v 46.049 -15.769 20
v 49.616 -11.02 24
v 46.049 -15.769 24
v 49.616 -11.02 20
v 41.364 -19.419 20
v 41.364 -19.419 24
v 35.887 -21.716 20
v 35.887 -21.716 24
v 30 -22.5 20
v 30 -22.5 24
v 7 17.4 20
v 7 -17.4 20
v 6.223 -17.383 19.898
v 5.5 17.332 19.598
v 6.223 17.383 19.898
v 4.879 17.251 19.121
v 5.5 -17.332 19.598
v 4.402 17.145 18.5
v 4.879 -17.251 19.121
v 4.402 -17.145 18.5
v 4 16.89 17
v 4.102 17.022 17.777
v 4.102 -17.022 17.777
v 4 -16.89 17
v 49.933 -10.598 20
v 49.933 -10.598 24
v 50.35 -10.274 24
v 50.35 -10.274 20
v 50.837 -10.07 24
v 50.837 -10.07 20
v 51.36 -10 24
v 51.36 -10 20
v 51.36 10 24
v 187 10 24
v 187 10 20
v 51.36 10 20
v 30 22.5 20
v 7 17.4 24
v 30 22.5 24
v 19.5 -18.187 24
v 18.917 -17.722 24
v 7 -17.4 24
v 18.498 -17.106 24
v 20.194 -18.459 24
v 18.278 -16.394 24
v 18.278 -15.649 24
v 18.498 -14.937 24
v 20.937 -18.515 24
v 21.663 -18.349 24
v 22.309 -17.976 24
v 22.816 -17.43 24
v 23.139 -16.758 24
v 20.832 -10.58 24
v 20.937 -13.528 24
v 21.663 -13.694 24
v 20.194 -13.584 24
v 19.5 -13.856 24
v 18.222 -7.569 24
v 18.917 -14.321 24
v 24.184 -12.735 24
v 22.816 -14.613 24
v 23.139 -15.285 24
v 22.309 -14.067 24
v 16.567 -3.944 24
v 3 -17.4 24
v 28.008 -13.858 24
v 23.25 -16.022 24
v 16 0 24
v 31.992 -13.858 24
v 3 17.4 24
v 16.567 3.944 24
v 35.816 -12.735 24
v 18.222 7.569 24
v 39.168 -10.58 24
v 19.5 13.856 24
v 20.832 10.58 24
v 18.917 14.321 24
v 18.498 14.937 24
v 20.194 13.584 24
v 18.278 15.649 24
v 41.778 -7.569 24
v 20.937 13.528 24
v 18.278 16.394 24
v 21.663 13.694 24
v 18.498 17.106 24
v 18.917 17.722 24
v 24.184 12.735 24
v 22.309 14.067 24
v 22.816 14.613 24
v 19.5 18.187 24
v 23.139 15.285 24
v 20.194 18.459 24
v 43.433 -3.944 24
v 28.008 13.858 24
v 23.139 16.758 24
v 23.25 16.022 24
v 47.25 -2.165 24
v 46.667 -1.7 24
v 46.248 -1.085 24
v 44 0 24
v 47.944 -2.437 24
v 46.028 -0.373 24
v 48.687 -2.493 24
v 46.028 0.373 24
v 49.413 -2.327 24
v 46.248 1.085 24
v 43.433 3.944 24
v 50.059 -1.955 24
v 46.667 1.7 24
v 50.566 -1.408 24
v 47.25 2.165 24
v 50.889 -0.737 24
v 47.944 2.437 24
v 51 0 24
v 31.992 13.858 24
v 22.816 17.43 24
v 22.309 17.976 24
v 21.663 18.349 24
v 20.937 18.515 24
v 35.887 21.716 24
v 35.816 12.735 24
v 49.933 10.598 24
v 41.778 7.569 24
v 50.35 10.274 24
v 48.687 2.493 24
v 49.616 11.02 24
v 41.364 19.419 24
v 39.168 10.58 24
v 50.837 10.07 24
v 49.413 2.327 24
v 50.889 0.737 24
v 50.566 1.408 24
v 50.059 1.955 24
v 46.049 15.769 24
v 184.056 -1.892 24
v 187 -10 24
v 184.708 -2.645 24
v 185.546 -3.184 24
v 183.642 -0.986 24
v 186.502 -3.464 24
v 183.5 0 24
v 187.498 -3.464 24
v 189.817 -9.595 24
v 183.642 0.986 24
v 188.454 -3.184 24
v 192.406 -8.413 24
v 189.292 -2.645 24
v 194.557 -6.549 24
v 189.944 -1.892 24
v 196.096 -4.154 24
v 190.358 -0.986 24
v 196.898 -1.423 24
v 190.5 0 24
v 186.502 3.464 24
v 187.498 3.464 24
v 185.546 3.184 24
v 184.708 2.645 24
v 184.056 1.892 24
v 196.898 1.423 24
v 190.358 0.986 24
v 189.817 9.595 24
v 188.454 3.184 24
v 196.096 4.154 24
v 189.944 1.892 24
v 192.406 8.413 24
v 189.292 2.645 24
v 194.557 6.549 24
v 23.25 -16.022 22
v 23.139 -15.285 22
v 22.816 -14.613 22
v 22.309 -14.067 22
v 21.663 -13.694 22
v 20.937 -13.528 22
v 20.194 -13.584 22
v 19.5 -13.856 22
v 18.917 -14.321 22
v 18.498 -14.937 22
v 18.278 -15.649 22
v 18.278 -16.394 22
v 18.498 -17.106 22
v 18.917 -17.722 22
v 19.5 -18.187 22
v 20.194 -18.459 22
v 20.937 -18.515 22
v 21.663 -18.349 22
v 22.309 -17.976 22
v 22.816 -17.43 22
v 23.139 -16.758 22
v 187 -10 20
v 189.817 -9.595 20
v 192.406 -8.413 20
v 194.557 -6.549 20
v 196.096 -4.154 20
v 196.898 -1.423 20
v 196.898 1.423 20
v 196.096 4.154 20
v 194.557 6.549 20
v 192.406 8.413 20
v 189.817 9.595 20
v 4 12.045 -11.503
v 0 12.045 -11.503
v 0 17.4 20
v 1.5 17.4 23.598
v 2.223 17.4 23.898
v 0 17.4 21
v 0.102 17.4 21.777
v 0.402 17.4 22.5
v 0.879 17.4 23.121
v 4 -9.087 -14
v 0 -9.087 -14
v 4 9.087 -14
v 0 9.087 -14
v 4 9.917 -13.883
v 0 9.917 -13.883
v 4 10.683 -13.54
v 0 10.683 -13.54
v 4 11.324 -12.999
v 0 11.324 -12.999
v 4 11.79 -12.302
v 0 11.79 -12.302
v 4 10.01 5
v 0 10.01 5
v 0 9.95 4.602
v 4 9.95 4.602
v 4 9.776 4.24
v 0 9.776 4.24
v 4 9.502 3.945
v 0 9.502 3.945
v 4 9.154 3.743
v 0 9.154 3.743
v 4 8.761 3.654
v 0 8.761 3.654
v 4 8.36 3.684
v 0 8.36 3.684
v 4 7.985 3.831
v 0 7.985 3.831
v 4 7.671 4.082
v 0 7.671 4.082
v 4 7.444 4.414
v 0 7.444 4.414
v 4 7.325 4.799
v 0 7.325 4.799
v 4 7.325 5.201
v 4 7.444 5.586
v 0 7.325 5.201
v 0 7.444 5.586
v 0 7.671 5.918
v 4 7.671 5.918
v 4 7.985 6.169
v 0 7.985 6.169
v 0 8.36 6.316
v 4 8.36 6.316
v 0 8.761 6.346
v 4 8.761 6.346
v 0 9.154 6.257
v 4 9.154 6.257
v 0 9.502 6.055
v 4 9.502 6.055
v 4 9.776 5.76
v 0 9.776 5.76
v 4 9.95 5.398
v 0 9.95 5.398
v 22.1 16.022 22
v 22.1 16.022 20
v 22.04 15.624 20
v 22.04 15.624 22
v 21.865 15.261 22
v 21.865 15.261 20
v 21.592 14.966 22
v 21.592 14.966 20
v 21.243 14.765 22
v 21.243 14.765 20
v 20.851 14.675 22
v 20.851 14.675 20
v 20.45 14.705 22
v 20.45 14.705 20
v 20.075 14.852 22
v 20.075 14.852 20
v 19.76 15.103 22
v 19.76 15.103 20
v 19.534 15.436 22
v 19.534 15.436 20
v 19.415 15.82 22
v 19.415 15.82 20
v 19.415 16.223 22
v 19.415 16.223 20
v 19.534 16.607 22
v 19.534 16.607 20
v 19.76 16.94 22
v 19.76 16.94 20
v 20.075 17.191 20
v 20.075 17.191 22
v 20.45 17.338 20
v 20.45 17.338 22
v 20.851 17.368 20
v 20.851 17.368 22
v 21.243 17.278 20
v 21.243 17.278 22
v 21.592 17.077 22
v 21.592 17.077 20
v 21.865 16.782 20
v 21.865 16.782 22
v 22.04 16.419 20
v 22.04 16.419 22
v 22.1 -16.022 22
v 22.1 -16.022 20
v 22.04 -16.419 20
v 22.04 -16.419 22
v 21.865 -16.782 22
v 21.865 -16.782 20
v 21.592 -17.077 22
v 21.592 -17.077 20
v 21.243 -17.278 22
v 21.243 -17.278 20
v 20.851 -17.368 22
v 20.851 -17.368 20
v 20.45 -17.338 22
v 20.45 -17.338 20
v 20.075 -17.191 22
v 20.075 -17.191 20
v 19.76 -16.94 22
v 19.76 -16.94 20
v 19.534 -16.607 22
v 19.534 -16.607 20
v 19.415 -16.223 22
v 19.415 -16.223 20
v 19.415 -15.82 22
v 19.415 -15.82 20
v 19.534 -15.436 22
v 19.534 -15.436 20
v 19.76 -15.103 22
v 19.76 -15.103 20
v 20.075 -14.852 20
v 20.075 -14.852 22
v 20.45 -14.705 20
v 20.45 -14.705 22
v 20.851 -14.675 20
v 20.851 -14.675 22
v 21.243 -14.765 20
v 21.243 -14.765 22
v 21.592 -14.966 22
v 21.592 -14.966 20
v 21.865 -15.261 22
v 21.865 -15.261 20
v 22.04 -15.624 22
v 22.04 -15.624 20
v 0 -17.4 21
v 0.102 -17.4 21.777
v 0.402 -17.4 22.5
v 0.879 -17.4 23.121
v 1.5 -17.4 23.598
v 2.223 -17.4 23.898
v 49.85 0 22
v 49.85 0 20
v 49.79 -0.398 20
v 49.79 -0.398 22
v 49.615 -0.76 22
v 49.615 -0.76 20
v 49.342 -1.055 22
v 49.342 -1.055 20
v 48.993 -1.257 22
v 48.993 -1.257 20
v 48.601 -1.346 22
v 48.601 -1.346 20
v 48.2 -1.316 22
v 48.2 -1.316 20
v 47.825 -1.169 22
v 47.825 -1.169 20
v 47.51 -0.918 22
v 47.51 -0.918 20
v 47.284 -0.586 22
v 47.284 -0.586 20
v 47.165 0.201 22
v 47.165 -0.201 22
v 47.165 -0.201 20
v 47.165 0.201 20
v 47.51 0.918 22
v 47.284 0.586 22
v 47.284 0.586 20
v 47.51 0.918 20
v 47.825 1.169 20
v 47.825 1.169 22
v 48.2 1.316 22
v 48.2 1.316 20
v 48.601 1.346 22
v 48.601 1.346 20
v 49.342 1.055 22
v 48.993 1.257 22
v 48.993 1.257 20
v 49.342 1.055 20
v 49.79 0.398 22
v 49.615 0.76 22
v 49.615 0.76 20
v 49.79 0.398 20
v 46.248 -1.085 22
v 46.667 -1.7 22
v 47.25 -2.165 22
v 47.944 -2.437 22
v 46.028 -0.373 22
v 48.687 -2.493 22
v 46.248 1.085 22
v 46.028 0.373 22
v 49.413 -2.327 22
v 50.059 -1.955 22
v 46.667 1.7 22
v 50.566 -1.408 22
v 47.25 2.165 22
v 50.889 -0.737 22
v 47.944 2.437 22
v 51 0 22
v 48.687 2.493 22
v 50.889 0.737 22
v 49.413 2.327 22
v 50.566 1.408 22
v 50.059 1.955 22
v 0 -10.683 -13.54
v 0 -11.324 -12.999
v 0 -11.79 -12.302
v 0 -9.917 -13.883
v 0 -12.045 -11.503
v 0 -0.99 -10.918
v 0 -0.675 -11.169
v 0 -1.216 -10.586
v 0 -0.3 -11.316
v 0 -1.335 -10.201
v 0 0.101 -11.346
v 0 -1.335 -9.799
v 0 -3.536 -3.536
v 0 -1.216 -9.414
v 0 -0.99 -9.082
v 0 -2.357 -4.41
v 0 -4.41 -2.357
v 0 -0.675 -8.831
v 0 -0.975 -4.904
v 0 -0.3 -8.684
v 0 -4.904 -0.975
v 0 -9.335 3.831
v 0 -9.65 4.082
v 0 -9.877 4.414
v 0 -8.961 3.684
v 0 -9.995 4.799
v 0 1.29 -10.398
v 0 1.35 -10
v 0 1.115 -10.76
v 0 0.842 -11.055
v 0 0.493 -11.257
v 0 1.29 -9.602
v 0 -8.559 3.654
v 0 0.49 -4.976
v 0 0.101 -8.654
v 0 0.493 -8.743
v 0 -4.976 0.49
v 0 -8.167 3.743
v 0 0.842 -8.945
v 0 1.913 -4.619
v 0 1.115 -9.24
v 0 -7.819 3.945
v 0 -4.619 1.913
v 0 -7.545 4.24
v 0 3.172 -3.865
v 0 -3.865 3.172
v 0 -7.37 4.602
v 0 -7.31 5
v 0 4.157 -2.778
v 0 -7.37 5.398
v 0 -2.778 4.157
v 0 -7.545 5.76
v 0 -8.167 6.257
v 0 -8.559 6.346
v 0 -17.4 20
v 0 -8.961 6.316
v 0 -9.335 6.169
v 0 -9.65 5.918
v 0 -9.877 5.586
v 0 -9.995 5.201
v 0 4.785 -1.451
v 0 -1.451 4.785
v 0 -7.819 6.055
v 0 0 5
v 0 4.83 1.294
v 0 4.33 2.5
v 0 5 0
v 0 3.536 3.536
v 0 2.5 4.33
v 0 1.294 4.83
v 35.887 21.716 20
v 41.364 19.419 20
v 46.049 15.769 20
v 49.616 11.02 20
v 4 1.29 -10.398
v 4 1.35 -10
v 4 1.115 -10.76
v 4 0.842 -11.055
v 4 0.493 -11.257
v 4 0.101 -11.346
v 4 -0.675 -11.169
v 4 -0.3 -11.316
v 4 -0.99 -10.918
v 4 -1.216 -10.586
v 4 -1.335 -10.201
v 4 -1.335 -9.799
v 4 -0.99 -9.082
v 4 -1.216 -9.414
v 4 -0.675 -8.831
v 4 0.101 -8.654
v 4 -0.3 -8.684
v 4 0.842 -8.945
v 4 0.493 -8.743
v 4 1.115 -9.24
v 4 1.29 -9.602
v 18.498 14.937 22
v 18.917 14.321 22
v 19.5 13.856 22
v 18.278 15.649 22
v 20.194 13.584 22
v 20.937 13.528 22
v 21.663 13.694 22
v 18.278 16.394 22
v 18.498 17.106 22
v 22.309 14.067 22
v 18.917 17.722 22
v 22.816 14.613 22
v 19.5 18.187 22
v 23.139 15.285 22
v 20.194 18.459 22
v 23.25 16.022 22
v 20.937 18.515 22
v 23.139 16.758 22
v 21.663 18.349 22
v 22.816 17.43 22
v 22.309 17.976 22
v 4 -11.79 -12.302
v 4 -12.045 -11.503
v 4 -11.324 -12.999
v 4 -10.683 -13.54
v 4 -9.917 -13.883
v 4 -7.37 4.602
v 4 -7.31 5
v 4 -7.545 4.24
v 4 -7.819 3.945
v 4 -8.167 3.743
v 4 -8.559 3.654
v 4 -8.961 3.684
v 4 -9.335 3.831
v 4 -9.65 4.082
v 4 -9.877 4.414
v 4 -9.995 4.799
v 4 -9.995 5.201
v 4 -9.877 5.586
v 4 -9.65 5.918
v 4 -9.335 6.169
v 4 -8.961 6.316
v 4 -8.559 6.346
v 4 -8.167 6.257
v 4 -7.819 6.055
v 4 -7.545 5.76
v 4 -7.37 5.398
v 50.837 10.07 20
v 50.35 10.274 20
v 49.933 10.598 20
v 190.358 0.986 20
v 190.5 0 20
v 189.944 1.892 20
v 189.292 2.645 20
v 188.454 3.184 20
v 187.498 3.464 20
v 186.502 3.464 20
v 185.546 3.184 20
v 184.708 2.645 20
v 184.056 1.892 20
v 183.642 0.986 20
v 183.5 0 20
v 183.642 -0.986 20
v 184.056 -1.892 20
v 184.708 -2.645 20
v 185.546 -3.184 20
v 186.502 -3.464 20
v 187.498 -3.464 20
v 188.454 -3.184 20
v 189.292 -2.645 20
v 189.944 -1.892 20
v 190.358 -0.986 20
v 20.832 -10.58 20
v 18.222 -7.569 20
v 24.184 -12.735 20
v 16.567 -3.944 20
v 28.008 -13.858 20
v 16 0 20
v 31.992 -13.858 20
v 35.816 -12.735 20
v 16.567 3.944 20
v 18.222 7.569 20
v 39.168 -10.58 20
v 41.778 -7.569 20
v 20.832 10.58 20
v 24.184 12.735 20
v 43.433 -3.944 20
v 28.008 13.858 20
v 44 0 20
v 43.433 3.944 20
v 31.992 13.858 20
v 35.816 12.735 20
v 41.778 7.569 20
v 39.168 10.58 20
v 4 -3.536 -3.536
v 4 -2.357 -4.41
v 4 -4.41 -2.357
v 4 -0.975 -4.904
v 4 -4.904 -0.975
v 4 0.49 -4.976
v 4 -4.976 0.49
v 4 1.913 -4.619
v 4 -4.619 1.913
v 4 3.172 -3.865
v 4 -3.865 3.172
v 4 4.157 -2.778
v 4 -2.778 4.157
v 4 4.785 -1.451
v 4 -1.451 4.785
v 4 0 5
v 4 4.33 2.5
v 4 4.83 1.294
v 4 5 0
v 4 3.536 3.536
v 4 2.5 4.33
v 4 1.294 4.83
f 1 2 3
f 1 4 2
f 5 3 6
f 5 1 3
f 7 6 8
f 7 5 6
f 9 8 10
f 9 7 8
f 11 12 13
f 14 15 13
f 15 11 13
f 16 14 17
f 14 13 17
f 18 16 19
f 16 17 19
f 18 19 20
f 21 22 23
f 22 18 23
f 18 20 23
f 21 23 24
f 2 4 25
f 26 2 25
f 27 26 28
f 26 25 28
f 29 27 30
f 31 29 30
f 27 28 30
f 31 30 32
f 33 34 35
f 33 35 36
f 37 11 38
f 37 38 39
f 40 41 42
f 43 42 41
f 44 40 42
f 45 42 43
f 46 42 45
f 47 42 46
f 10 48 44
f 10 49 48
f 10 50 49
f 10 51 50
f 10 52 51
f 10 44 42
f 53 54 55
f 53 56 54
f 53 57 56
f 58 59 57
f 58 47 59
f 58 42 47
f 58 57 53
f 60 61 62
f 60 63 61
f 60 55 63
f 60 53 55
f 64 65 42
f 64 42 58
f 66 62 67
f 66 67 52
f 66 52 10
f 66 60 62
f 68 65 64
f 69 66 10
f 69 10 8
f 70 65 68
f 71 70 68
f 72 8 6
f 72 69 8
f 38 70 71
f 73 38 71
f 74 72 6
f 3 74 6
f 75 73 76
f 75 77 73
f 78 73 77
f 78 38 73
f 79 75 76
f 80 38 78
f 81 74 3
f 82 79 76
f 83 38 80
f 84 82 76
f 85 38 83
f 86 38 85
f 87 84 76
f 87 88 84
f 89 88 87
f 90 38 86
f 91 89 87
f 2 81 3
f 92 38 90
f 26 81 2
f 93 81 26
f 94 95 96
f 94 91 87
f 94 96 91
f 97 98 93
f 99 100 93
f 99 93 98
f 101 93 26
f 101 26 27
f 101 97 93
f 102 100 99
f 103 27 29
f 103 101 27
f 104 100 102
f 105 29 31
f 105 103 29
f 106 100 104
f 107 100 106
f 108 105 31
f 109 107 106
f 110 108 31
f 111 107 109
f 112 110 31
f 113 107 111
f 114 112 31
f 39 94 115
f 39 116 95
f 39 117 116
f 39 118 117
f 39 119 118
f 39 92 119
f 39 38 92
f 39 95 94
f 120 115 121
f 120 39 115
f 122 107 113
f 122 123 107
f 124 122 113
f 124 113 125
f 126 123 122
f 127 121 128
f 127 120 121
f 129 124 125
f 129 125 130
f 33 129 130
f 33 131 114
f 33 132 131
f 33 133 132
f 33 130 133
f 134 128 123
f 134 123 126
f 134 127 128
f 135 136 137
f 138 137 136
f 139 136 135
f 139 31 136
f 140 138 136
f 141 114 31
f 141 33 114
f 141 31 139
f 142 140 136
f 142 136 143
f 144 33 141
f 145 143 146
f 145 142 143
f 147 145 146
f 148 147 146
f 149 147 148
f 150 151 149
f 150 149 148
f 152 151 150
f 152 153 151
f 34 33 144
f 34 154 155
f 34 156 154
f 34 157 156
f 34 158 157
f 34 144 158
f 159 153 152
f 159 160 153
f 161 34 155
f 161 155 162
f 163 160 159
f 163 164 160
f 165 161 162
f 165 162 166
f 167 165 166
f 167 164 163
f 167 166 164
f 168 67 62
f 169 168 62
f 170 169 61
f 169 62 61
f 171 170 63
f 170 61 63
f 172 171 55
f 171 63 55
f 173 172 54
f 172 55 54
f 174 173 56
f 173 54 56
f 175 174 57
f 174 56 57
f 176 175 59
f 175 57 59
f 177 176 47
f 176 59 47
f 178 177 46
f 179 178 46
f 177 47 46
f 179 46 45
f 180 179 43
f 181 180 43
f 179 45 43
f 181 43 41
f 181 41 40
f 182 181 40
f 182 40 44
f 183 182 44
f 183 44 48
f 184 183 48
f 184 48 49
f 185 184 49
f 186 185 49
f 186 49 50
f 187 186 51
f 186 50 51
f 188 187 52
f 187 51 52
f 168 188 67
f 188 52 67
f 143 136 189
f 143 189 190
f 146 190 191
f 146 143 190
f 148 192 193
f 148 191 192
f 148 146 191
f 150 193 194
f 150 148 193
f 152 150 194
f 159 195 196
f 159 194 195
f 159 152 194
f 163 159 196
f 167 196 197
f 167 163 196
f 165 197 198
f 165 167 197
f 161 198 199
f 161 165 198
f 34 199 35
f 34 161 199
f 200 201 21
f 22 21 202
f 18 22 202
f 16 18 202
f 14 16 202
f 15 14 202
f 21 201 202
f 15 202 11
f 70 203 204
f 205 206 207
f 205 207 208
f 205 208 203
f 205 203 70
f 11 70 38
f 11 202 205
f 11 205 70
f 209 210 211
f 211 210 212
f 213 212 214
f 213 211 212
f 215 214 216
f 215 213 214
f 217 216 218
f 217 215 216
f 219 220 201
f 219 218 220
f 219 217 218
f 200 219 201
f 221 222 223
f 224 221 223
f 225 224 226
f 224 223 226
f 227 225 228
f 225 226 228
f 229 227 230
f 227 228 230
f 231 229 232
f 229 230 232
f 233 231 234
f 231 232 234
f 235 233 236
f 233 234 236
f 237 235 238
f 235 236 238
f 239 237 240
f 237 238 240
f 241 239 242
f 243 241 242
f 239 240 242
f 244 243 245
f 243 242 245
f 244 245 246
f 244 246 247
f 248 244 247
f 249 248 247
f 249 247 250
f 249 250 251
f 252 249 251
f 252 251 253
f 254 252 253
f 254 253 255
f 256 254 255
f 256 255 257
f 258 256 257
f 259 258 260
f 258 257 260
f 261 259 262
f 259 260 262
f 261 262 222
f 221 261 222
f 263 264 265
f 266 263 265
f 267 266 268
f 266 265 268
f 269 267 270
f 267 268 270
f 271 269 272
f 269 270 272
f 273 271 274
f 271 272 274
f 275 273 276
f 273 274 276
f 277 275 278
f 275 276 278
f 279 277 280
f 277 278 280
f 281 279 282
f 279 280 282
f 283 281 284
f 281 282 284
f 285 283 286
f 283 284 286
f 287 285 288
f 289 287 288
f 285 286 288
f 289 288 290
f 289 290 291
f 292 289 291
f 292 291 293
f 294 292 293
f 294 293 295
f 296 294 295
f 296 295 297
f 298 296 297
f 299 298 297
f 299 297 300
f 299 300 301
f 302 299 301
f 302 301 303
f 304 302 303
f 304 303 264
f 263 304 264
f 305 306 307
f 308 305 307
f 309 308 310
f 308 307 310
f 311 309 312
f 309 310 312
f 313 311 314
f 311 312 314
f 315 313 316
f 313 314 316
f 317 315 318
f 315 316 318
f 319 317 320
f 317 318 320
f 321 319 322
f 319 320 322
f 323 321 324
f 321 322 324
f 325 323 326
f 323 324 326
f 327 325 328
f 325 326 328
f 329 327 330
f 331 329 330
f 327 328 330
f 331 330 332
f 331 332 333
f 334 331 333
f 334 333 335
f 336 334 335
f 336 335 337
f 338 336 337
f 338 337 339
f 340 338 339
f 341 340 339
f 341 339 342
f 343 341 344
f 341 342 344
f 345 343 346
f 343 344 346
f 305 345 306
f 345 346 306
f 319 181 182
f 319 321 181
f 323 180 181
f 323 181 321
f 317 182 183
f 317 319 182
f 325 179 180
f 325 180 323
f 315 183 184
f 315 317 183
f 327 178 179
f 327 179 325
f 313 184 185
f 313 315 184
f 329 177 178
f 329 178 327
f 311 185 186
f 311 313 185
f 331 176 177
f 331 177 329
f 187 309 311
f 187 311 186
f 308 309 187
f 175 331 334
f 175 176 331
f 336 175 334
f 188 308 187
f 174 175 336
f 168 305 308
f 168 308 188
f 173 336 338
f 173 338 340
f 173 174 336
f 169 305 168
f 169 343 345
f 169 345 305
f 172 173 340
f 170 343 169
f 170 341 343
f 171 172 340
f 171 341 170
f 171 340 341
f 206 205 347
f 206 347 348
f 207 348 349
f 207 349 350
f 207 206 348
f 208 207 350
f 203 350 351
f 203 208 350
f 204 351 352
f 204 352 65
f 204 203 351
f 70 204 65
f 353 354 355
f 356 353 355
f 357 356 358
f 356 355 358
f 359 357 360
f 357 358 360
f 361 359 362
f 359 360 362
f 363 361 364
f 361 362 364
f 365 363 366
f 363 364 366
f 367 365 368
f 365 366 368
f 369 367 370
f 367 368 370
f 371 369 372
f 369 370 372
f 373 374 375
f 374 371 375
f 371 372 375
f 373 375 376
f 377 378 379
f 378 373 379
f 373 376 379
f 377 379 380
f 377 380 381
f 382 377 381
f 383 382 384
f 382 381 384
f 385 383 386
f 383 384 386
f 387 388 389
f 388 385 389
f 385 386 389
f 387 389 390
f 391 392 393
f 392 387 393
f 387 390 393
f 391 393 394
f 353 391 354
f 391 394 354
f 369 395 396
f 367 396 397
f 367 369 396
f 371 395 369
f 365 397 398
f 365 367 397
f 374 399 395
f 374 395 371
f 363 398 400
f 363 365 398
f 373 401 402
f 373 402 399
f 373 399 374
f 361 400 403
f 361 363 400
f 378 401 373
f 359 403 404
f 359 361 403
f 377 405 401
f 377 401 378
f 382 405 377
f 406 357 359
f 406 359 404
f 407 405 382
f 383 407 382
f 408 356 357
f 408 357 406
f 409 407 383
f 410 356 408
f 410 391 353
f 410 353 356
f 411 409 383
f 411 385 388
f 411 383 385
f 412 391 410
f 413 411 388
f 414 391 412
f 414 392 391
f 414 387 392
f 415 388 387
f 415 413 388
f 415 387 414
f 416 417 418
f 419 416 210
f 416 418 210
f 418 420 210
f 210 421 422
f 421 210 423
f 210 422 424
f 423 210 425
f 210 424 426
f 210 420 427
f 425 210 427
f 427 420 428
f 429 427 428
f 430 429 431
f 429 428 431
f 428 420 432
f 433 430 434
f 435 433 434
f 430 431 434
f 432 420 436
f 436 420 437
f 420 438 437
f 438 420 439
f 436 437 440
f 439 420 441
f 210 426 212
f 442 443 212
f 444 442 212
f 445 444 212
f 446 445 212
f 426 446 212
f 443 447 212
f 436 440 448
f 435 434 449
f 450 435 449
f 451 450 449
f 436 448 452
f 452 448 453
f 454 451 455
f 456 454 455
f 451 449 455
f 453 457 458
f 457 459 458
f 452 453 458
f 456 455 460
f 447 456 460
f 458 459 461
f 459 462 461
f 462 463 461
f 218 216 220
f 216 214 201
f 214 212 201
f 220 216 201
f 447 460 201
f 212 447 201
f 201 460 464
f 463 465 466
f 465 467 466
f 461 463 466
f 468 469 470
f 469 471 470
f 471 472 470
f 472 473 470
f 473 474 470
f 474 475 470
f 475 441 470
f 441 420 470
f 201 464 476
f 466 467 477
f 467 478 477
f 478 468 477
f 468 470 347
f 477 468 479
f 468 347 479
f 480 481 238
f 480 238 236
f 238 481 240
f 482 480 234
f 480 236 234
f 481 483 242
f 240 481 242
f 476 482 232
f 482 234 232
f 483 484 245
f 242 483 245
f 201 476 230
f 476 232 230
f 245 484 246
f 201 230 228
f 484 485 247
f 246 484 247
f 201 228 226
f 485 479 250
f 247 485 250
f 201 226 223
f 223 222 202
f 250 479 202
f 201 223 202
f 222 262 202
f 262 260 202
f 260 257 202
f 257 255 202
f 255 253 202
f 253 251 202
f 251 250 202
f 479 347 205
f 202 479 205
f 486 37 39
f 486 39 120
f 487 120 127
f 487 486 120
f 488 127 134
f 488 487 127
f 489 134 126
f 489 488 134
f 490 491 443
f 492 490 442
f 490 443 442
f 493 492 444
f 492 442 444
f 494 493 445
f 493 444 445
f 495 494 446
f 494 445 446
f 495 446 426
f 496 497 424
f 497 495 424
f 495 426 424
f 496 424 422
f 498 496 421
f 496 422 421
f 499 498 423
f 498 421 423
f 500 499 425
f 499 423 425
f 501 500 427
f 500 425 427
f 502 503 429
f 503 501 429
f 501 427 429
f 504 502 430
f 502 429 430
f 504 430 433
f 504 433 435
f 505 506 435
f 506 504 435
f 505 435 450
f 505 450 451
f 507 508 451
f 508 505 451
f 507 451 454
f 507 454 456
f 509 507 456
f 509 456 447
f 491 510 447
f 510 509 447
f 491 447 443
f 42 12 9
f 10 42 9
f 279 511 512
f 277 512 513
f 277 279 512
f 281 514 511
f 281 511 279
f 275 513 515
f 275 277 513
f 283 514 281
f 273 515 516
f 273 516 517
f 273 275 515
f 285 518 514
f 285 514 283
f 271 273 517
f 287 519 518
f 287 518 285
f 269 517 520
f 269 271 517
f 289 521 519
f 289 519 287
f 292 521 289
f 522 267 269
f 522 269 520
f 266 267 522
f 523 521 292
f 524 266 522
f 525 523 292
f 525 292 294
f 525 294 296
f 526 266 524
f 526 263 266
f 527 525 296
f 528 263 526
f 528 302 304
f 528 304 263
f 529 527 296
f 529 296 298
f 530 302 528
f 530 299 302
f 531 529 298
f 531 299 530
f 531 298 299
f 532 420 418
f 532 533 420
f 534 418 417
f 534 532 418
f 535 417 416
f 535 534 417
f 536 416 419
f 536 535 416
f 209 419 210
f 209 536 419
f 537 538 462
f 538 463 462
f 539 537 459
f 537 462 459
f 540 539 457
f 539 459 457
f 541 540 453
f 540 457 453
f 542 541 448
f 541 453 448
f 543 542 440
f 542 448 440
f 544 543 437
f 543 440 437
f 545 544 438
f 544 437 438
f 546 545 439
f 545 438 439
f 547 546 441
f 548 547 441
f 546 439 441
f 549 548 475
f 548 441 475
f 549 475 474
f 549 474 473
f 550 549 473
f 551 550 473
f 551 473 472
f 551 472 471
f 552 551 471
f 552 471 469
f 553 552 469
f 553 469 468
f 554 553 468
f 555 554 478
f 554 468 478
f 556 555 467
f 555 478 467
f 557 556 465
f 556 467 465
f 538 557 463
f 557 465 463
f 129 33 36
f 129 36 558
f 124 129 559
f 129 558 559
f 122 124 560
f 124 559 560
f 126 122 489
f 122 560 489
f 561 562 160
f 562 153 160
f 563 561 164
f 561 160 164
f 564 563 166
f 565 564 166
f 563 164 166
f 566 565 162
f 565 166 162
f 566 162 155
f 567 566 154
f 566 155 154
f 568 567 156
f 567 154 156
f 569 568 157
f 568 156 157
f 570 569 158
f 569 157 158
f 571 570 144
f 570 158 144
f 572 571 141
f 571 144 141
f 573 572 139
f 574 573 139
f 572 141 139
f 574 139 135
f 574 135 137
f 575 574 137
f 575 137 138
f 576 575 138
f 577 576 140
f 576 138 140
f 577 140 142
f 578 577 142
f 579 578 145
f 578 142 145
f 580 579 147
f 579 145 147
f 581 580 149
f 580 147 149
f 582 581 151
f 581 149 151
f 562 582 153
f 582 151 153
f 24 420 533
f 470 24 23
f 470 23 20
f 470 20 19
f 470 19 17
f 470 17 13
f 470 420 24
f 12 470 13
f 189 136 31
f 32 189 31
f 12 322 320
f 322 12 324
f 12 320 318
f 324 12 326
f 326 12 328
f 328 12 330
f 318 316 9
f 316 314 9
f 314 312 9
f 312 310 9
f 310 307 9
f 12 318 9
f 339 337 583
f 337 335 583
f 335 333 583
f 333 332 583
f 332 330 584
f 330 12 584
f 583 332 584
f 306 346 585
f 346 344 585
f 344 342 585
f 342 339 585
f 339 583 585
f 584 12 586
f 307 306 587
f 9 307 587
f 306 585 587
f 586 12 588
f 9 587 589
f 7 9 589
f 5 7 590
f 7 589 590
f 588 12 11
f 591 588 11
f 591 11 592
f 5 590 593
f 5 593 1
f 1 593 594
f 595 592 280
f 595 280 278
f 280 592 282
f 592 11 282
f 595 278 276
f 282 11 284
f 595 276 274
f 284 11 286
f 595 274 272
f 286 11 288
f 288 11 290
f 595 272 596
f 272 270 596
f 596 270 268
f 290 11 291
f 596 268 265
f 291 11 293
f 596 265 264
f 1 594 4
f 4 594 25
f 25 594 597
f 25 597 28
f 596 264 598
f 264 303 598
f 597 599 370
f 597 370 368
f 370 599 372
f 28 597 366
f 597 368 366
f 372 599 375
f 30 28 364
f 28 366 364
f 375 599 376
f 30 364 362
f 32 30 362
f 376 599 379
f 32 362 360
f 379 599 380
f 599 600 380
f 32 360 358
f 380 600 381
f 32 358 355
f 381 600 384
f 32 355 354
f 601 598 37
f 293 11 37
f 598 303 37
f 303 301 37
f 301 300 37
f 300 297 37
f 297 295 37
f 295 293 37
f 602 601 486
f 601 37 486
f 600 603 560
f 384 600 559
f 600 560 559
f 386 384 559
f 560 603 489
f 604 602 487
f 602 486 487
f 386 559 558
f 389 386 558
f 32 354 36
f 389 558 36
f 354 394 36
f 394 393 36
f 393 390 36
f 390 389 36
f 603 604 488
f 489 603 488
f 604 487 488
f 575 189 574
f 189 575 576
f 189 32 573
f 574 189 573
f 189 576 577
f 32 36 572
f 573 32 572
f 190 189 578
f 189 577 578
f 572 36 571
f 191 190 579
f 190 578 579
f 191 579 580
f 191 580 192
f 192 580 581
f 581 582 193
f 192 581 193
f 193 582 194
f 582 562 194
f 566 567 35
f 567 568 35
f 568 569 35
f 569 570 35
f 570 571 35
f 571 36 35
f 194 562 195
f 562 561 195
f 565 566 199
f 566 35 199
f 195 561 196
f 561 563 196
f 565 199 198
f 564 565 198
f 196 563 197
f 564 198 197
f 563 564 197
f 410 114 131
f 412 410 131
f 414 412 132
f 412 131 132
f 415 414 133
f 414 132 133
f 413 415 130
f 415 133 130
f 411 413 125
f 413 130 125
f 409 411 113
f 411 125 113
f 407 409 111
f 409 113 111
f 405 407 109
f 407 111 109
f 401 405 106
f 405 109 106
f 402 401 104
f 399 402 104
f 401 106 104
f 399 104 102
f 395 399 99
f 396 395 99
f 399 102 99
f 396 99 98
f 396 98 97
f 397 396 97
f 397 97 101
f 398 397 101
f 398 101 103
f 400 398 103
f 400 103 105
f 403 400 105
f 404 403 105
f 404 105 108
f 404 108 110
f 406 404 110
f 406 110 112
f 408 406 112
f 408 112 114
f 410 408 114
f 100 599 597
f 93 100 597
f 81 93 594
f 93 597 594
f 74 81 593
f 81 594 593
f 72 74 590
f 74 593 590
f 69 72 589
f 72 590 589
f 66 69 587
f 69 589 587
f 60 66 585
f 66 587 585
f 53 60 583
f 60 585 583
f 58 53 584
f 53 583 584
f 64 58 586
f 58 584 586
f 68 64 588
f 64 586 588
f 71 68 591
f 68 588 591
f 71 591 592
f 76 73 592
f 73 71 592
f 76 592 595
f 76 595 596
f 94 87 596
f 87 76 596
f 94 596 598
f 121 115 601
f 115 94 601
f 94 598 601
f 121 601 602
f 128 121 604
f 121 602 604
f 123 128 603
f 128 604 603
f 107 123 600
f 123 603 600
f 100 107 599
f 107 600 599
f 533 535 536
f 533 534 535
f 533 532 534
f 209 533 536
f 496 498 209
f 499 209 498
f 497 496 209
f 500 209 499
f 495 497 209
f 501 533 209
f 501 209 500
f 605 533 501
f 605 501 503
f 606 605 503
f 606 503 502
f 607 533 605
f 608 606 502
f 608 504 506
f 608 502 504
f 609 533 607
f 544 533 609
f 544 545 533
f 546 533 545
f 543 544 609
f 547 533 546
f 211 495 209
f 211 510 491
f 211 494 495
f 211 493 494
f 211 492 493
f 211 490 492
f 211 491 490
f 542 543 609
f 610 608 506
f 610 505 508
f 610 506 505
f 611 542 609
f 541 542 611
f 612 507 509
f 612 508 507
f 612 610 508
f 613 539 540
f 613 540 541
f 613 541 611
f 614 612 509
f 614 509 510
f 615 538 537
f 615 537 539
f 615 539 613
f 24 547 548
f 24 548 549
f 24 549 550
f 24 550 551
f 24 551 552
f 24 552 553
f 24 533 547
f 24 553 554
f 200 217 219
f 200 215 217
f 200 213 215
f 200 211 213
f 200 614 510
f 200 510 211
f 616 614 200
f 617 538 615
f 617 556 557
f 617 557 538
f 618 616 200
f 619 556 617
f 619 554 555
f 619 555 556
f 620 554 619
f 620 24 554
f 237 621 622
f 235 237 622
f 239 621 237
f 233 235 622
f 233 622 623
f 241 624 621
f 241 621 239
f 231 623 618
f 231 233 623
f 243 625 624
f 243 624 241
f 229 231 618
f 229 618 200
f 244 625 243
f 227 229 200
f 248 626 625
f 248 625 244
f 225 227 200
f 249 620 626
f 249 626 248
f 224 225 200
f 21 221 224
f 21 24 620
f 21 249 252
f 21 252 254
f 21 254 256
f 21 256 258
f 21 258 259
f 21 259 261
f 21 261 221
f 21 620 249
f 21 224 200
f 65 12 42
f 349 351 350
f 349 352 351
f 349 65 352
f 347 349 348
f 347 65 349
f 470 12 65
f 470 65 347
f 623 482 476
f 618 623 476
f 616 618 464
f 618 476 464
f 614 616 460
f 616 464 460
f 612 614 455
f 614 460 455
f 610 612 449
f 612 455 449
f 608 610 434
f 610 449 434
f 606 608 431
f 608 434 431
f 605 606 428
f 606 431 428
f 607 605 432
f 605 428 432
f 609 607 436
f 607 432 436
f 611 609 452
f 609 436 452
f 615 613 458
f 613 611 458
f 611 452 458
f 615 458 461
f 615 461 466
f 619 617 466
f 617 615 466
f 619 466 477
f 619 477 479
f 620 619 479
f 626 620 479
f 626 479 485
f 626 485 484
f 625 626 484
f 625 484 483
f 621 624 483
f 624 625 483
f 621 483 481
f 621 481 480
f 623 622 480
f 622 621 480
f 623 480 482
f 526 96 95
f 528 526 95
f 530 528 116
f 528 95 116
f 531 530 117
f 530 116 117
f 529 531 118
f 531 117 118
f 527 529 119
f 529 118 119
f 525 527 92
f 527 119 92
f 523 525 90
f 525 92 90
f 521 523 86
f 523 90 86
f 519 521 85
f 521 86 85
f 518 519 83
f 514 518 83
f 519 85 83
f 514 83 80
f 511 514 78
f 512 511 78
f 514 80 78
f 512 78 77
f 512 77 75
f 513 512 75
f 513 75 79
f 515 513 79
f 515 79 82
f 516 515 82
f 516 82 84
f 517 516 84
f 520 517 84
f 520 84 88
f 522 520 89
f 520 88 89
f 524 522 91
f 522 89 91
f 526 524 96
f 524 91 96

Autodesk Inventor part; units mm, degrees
ref_plane "YZ Plane" through (0, 0, 0) normal (1, 0, 0) x (0, 1, 0)
ref_plane "XZ Plane" through (0, 0, 0) normal (0, 1, 0) x (-1, 0, 0)
ref_plane "XY Plane" through (0, 0, 0) normal (0, 0, 1) x (1, 0, 0)
sketch "スケッチ1" plane through (0, 0, 0) normal (1, 0, 0) x (0, 1, 0)
  circle A0 centre (0, 0) radius 10
  circle A1 centre (0, -10) radius 1.35
  circle A2 centre (8.6603, 5) radius 1.35
  circle A3 centre (-8.6603, 5) radius 1.35
  circle A4 centre (0, 0) radius 5
  line L0 (0, 0) -> (0, 50)
  circle A5 centre (0, 50) radius 22.5
  circle A6 centre (0, 0) radius 14
  line L1 (-14, 0) -> (-22.5, 50)
  line L2 (14, 0) -> (22.5, 50)
  line L3 (0, -14) -> (-11.62, -14)
  line L4 (-11.62, -14) -> (-14, 0)
  line L5 (0, -14) -> (11.62, -14)
  line L6 (11.62, -14) -> (14, 0)
  line L7 (0, 20) -> (-17.4, 20)
  line L8 (0, 20) -> (17.4, 20)
  dimension "d0" = 20
  dimension "d1" = 2.7
  dimension "d4" = 360
  dimension "d6" = 10
  dimension "d7" = 50
  dimension "d8" = 45
  dimension "d9" = 28
extrude "押し出し1" add sketch "スケッチ1" along normal blind 4 contours A0 A1 A3 A2 | A6 L6 L4 | A6 L1 L7 L0 | L0 L8 L2 A6 | L6 L5 A6 | A6 L3 L4
sketch "スケッチ2" plane through (0, -17.4, 20) normal (0, 0, 1) x (1, 0, 0)
  line L0 (0, 17.4) -> (30, 17.4)
  circle A0 centre (30, 17.4) radius 22.5
  circle A1 centre (30, 17.4) radius 18.5
  circle A2 centre (30, 17.4) radius 14
  circle A3 centre (48.5, 17.4) radius 1.35
  circle A4 centre (20.75, 33.4215) radius 1.35
  circle A5 centre (20.75, 1.3785) radius 1.35
  line L1 (0, 29.02) -> (0, 34.8) projected
  line L2 (0, 0) -> (0, 5.78) projected
  line L3 (0, 34.8) -> (0, 0)
  line L4 (4, 29.02) -> (4, 34.8) projected
  line L5 (4, 34.8) -> (7, 34.8)
  line L6 (7, 34.8) -> (30, 39.9)
  line L7 (4, 0) -> (4, 5.78) projected
  line L8 (4, 0) -> (7, 0)
  line L9 (7, 0) -> (30, -5.1)
  line L10 (4, 0) -> (0, 0)
  line L11 (0, 34.8) -> (4, 34.8) projected
  line L12 (0, 0) -> (0, 34.8)
  line L13 (0, 34.8) -> (4, 34.8)
  dimension "d14" = 37
  dimension "d12" = 30
  dimension "d13" = 45
  dimension "d15" = 28
  dimension "d16" = 2.7
  dimension "d19" = 360
  dimension "d21" = 3
  dimension "d22" = 3
extrude "押し出し2" add sketch "スケッチ2" along normal blind 4 contours L3 L1 L11 L5 L6 A0 L0 | L0 A0 L9 L8 L10 L2 L3 | A1 A4 A3 A5 | A0 L6 L9
fillet "フィレット1" radius 3 2 edges at (4, 0, 20) (0, 0, 24)
fillet "フィレット2" radius 3 2 edges at (2, -11.62, -14) (2, 11.62, -14)
sketch "スケッチ7" plane through (0, -17.4, 24) normal (0, 0, 1) x (1, 0, 0)
  circle A0 centre (30, 17.4) radius 14 projected
  line L0 (30, 17.4) -> (187, 17.4)
  line L1 (30, 17.4) -> (187, 17.4) construction
  circle A1 centre (187, 17.4) radius 3.5
  circle A2 centre (187, 17.4) radius 10
  line L2 (187, 27.4) -> (50.1556, 27.4)
  arc A3 (30, -5.1) -> (30, 39.9) centre (30, 17.4) ccw projected
  line L3 (187, 27.4) -> (323.8444, 27.4) construction
  line L4 (187, 7.4) -> (50.1556, 7.4)
  point P0 (0, 17.4)
  dimension "d55" = 157
  dimension "d56" = 0
  dimension "d57" = 7
  dimension "d58" = 20
  dimension "d59" = 180
extrude "押し出し7" add sketch "スケッチ7" against normal blind 4 contours A3 L2 A2 L0 | L0 A2 L4 A3 | A2
fillet "フィレット3" radius 2 2 edges at (50.1556, 10, 22) (50.1556, -10, 22)
sketch "スケッチ8" plane through (0, -17.4, 24) normal (0, 0, 1) x (1, 0, 0)
  circle A0 centre (20.75, 33.4215) radius 1.35 projected
  circle A1 centre (20.75, 33.4215) radius 2.5
  circle A2 centre (48.5, 17.4) radius 1.35 projected
  circle A3 centre (48.5, 17.4) radius 2.5
  circle A4 centre (20.75, 1.3785) radius 1.35 projected
  circle A5 centre (20.75, 1.3785) radius 2.5
  point P0 (0, 17.4)
  dimension "d63" = 5
  dimension "d64" = 5
  dimension "d65" = 5
extrude "押し出し8" cut sketch "スケッチ8" against normal blind 2 contours A0 | A1 | A3 | A4 | A5
properties part number "motor_holder_2" material "アルミニウム 6061"
